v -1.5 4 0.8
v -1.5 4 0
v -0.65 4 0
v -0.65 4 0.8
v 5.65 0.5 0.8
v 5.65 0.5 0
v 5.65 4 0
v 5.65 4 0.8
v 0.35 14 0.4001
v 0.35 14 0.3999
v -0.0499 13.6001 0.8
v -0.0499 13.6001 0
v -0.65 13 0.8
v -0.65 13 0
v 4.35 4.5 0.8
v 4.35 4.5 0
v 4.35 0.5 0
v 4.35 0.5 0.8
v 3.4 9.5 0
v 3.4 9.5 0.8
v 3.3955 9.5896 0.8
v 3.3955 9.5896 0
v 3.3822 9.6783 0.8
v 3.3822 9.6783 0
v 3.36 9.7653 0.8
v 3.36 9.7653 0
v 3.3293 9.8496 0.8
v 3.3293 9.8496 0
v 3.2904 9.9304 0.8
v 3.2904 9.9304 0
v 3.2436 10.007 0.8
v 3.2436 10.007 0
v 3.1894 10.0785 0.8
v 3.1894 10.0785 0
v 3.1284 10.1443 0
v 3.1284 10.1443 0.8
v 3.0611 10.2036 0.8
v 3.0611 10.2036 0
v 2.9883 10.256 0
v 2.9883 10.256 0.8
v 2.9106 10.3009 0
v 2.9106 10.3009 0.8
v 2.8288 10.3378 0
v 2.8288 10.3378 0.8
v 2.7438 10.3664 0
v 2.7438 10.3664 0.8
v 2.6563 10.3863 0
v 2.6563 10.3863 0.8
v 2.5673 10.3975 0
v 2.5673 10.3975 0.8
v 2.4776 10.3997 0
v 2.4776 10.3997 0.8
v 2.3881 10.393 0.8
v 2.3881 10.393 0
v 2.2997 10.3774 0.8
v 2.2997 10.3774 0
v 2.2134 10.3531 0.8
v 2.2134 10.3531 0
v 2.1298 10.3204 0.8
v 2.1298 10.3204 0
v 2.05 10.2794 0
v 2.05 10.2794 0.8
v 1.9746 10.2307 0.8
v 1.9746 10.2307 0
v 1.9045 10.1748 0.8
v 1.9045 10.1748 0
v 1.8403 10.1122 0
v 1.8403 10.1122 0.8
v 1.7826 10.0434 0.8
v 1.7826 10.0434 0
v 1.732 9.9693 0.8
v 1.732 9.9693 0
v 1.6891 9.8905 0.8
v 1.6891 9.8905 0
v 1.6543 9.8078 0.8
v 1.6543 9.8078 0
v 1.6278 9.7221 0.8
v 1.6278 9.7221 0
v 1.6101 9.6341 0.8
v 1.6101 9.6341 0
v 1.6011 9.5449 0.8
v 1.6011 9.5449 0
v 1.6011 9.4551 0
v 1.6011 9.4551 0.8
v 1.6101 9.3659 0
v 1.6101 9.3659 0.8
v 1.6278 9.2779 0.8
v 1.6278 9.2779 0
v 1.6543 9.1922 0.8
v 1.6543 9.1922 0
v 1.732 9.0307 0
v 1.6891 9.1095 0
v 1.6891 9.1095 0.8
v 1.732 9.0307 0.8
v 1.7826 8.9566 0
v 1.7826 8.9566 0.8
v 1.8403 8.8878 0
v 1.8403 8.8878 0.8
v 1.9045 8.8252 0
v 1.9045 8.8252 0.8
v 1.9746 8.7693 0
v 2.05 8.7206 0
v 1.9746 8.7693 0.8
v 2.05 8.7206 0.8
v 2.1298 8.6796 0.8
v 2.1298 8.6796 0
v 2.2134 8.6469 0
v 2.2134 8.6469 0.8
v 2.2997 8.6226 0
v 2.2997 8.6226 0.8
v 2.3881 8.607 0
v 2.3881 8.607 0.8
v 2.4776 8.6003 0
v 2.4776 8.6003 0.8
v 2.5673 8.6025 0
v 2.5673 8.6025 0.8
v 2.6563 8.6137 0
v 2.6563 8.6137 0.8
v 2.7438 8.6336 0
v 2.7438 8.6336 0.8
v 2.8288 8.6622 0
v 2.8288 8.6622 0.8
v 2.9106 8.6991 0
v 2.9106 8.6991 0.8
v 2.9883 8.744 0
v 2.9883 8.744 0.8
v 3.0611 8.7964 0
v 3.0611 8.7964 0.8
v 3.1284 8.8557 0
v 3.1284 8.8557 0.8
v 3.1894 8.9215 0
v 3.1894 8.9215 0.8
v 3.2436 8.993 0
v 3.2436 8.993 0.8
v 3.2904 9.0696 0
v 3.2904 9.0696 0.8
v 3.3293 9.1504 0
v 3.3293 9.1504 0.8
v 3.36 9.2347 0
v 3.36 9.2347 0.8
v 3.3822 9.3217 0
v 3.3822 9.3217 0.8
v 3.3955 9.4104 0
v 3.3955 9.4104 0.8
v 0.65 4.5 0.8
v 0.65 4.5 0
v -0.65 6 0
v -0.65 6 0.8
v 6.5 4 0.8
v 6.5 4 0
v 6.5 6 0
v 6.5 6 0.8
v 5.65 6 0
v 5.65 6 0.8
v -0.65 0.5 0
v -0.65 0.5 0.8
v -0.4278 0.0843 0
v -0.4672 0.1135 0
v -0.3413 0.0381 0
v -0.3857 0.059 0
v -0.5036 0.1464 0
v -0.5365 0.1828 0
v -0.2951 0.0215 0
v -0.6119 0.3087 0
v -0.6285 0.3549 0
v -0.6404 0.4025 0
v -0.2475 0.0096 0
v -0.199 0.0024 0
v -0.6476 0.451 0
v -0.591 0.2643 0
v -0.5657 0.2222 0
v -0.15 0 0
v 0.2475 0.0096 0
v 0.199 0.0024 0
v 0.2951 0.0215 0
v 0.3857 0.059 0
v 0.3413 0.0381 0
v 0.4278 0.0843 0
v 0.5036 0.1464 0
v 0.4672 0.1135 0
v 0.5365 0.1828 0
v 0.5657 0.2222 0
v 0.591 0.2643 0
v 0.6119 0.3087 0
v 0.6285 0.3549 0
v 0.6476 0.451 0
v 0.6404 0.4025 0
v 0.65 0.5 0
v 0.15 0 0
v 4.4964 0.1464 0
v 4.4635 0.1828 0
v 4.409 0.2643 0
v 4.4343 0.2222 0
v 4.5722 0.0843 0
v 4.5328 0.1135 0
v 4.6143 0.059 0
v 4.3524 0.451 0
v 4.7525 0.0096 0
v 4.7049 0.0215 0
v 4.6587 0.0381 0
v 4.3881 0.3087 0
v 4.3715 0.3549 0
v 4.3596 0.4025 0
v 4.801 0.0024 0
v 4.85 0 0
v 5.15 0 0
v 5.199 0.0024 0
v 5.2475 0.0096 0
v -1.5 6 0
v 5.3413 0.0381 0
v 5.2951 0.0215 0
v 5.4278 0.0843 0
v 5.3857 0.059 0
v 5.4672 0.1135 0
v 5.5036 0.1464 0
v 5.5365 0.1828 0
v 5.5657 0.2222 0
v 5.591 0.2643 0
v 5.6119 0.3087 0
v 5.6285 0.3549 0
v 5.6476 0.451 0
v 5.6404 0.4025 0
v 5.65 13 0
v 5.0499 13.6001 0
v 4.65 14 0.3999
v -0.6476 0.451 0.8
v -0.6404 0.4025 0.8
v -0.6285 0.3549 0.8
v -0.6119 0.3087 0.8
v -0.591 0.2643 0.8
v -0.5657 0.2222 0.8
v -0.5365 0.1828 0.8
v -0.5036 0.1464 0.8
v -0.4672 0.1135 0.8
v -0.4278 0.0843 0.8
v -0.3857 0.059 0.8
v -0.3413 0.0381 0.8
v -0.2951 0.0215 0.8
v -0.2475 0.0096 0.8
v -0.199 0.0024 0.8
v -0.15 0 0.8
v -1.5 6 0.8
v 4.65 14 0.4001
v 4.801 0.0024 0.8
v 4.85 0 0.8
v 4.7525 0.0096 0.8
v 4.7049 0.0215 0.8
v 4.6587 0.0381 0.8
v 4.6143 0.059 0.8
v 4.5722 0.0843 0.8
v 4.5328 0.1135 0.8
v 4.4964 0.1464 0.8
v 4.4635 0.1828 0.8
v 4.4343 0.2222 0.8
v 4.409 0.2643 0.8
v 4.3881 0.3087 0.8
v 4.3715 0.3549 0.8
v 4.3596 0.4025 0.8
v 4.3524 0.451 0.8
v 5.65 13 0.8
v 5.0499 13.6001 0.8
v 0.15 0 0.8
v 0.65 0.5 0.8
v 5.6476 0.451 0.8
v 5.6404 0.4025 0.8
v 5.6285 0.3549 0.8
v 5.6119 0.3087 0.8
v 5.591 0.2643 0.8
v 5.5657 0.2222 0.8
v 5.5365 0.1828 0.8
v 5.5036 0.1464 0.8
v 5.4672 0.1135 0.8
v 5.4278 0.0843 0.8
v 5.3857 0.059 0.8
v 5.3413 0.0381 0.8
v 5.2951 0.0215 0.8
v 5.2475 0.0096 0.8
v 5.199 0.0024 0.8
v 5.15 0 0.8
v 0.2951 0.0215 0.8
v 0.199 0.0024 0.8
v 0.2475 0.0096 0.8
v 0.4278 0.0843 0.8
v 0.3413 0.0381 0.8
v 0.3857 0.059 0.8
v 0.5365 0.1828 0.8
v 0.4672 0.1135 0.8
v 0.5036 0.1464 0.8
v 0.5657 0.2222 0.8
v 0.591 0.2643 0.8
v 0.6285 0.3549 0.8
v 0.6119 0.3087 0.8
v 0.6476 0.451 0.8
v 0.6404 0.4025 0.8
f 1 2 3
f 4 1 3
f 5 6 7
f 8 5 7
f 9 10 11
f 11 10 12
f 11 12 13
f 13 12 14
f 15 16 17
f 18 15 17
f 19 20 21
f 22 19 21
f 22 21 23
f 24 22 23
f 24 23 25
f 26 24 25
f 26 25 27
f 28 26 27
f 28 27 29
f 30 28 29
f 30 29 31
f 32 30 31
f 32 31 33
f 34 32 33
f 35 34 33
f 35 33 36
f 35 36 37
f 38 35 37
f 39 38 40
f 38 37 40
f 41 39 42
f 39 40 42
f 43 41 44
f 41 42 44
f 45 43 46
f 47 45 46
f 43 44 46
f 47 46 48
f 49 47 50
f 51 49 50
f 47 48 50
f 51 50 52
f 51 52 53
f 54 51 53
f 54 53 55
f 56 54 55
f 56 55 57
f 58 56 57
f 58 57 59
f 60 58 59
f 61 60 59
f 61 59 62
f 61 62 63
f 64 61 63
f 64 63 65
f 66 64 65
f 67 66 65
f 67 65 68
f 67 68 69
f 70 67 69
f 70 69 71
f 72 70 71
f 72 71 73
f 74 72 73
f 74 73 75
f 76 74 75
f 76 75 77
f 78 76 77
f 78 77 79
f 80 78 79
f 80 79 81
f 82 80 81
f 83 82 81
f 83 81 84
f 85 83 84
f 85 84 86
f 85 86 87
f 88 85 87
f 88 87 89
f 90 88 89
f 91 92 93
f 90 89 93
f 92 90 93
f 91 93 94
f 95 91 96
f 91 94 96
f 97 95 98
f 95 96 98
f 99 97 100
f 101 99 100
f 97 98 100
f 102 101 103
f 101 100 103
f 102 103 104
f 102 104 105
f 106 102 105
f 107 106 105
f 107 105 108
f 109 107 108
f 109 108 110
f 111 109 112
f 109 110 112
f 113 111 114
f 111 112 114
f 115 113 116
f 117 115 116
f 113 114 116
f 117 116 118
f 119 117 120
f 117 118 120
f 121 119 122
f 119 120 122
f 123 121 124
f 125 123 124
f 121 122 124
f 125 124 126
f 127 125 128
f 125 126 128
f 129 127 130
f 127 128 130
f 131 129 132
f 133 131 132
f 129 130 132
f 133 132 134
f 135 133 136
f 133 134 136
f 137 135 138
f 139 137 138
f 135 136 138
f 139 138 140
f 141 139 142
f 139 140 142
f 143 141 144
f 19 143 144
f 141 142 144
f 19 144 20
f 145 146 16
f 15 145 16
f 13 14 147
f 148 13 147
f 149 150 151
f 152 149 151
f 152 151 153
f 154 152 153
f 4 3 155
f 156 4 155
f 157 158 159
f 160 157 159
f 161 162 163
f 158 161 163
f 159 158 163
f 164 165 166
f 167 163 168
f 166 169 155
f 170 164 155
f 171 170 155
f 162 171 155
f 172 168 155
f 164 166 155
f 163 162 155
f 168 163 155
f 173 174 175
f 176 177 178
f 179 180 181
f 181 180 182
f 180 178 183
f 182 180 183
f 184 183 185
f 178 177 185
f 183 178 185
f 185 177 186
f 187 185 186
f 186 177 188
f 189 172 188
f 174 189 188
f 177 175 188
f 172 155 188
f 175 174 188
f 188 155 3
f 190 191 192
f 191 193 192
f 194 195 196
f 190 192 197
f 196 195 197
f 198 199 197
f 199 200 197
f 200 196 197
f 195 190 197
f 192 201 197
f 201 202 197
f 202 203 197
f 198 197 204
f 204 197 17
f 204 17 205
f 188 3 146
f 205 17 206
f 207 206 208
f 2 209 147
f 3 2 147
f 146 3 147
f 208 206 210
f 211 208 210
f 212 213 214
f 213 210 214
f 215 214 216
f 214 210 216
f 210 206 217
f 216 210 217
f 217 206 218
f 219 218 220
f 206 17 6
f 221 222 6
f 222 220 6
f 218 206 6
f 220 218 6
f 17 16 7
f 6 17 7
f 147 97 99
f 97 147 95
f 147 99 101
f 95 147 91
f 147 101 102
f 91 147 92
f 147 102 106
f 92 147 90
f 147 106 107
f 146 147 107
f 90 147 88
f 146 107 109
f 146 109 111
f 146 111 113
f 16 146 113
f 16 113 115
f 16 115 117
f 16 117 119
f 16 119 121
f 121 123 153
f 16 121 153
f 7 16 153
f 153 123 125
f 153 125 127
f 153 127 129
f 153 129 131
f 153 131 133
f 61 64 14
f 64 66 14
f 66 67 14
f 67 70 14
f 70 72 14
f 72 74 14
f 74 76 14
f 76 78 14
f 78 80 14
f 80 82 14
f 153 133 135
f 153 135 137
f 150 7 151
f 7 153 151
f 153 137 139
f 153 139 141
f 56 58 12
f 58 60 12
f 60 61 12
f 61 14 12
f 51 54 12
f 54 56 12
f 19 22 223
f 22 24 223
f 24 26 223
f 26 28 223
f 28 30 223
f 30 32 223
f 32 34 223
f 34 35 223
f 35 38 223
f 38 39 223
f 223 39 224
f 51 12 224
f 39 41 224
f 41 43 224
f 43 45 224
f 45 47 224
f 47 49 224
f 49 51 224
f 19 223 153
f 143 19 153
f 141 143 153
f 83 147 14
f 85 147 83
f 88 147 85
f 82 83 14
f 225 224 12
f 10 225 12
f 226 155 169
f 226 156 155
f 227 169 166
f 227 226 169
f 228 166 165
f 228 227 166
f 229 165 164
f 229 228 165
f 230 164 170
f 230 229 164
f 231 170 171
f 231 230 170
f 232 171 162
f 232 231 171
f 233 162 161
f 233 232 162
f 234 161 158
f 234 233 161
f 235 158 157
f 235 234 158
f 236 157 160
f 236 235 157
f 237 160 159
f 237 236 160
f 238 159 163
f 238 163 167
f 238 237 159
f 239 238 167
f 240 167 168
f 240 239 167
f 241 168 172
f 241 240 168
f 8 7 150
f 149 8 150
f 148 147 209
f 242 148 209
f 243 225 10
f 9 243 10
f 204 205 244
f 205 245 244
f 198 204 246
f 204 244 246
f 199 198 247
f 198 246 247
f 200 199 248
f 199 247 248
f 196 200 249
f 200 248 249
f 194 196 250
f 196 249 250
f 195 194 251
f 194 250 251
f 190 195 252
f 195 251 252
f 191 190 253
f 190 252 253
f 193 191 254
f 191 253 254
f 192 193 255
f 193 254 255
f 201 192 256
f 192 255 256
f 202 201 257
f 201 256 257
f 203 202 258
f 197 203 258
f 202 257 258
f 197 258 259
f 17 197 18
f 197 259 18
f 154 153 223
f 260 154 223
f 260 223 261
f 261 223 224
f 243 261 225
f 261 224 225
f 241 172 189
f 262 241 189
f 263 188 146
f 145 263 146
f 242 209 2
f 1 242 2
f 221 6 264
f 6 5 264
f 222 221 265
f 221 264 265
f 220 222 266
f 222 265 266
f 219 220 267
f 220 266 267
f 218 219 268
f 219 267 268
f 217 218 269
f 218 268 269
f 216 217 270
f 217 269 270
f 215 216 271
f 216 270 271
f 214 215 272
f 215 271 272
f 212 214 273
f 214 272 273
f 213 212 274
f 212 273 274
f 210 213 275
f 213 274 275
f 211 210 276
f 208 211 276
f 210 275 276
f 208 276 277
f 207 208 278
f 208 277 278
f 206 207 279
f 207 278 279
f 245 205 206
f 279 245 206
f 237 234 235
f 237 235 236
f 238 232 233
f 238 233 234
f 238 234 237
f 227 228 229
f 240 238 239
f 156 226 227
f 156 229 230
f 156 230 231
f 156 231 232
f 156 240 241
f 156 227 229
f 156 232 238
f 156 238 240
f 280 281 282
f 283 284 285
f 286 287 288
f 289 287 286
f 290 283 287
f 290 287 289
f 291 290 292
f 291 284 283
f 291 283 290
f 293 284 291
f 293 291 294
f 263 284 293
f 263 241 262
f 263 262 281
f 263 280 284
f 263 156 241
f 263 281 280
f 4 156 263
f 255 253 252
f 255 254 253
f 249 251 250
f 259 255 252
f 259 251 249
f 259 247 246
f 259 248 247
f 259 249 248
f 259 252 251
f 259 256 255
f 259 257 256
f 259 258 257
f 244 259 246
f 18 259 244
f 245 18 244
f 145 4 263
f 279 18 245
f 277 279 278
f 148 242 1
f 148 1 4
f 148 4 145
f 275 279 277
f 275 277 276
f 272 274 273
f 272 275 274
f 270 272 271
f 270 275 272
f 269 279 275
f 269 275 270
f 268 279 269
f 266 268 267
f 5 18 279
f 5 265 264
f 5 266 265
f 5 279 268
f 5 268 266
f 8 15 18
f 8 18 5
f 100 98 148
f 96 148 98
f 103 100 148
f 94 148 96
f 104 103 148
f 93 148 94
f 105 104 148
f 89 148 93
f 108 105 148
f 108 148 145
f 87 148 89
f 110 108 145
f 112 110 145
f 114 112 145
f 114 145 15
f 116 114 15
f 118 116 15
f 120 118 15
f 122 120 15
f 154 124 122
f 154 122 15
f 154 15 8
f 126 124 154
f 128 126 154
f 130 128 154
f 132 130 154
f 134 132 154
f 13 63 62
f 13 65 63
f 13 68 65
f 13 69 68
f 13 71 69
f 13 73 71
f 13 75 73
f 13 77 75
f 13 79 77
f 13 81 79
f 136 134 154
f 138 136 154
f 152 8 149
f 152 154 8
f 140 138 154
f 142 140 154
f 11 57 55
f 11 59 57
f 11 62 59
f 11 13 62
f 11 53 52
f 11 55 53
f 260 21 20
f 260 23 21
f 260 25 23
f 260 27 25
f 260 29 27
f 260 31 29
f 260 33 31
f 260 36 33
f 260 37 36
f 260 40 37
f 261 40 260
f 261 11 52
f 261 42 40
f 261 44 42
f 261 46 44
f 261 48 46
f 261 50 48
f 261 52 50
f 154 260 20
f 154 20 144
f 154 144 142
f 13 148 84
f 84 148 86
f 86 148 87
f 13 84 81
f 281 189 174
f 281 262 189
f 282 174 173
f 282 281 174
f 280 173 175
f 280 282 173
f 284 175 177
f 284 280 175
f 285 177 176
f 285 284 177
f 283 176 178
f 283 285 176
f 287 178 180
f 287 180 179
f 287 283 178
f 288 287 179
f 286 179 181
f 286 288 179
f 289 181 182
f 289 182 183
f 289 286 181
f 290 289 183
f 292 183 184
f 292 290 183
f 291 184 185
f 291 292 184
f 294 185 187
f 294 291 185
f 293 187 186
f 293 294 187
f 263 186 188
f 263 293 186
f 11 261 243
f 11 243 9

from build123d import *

# Parameters (mm, degrees)
EXTRUSION1_DEPTH   = 0.8
CHANFREIN1_SIZE    = 0.4
CONG_1_R           = 0.5
SKETCH1_R          = 0.9
CUT_EXTRUDE1_DEPTH = 16.45606677


with BuildPart() as part:
    # Esquisse1 → Extrusion1 (new body)
    with BuildSketch(Plane.XY):
        Polygon((-0.65, 0), (0.65, 0), (0.65, 4.5), (4.35, 4.5), (4.35, 0), (5.65, 0), (5.65, 4), (6.5, 4), (6.5, 6), (5.65, 6), (5.65, 13), (4.65, 14), (0.35, 14), (-0.65, 13), (-0.65, 6), (-1.5, 6), (-1.5, 4), (-0.65, 4), align=None)
    extrude(amount=EXTRUSION1_DEPTH)

    # Chanfrein1
    chanfrein1_edges = [part.edges().sort_by_distance(p)[0] for p in [
        (2.5, 14, 0.8),
        (2.5, 14, 0),
    ]]
    chamfer(chanfrein1_edges, length=CHANFREIN1_SIZE - 0.0001)  # a hair under: the kernel refuses the full size

    # Congé1
    cong_1_edges = [part.edges().sort_by_distance(p)[0] for p in [
        (5.65, 0, 0.4),
        (4.35, 0, 0.4),
        (0.65, 0, 0.4),
        (-0.65, 0, 0.4),
    ]]
    fillet(cong_1_edges, radius=CONG_1_R)

    # Sketch1 → Cut-Extrude1 (cut, through all)
    with BuildSketch(Plane.XY.offset(0.8)):
        with Locations((2.5, 9.5)):
            Circle(SKETCH1_R)
    extrude(amount=-CUT_EXTRUDE1_DEPTH, mode=Mode.SUBTRACT)


solid = part.part
